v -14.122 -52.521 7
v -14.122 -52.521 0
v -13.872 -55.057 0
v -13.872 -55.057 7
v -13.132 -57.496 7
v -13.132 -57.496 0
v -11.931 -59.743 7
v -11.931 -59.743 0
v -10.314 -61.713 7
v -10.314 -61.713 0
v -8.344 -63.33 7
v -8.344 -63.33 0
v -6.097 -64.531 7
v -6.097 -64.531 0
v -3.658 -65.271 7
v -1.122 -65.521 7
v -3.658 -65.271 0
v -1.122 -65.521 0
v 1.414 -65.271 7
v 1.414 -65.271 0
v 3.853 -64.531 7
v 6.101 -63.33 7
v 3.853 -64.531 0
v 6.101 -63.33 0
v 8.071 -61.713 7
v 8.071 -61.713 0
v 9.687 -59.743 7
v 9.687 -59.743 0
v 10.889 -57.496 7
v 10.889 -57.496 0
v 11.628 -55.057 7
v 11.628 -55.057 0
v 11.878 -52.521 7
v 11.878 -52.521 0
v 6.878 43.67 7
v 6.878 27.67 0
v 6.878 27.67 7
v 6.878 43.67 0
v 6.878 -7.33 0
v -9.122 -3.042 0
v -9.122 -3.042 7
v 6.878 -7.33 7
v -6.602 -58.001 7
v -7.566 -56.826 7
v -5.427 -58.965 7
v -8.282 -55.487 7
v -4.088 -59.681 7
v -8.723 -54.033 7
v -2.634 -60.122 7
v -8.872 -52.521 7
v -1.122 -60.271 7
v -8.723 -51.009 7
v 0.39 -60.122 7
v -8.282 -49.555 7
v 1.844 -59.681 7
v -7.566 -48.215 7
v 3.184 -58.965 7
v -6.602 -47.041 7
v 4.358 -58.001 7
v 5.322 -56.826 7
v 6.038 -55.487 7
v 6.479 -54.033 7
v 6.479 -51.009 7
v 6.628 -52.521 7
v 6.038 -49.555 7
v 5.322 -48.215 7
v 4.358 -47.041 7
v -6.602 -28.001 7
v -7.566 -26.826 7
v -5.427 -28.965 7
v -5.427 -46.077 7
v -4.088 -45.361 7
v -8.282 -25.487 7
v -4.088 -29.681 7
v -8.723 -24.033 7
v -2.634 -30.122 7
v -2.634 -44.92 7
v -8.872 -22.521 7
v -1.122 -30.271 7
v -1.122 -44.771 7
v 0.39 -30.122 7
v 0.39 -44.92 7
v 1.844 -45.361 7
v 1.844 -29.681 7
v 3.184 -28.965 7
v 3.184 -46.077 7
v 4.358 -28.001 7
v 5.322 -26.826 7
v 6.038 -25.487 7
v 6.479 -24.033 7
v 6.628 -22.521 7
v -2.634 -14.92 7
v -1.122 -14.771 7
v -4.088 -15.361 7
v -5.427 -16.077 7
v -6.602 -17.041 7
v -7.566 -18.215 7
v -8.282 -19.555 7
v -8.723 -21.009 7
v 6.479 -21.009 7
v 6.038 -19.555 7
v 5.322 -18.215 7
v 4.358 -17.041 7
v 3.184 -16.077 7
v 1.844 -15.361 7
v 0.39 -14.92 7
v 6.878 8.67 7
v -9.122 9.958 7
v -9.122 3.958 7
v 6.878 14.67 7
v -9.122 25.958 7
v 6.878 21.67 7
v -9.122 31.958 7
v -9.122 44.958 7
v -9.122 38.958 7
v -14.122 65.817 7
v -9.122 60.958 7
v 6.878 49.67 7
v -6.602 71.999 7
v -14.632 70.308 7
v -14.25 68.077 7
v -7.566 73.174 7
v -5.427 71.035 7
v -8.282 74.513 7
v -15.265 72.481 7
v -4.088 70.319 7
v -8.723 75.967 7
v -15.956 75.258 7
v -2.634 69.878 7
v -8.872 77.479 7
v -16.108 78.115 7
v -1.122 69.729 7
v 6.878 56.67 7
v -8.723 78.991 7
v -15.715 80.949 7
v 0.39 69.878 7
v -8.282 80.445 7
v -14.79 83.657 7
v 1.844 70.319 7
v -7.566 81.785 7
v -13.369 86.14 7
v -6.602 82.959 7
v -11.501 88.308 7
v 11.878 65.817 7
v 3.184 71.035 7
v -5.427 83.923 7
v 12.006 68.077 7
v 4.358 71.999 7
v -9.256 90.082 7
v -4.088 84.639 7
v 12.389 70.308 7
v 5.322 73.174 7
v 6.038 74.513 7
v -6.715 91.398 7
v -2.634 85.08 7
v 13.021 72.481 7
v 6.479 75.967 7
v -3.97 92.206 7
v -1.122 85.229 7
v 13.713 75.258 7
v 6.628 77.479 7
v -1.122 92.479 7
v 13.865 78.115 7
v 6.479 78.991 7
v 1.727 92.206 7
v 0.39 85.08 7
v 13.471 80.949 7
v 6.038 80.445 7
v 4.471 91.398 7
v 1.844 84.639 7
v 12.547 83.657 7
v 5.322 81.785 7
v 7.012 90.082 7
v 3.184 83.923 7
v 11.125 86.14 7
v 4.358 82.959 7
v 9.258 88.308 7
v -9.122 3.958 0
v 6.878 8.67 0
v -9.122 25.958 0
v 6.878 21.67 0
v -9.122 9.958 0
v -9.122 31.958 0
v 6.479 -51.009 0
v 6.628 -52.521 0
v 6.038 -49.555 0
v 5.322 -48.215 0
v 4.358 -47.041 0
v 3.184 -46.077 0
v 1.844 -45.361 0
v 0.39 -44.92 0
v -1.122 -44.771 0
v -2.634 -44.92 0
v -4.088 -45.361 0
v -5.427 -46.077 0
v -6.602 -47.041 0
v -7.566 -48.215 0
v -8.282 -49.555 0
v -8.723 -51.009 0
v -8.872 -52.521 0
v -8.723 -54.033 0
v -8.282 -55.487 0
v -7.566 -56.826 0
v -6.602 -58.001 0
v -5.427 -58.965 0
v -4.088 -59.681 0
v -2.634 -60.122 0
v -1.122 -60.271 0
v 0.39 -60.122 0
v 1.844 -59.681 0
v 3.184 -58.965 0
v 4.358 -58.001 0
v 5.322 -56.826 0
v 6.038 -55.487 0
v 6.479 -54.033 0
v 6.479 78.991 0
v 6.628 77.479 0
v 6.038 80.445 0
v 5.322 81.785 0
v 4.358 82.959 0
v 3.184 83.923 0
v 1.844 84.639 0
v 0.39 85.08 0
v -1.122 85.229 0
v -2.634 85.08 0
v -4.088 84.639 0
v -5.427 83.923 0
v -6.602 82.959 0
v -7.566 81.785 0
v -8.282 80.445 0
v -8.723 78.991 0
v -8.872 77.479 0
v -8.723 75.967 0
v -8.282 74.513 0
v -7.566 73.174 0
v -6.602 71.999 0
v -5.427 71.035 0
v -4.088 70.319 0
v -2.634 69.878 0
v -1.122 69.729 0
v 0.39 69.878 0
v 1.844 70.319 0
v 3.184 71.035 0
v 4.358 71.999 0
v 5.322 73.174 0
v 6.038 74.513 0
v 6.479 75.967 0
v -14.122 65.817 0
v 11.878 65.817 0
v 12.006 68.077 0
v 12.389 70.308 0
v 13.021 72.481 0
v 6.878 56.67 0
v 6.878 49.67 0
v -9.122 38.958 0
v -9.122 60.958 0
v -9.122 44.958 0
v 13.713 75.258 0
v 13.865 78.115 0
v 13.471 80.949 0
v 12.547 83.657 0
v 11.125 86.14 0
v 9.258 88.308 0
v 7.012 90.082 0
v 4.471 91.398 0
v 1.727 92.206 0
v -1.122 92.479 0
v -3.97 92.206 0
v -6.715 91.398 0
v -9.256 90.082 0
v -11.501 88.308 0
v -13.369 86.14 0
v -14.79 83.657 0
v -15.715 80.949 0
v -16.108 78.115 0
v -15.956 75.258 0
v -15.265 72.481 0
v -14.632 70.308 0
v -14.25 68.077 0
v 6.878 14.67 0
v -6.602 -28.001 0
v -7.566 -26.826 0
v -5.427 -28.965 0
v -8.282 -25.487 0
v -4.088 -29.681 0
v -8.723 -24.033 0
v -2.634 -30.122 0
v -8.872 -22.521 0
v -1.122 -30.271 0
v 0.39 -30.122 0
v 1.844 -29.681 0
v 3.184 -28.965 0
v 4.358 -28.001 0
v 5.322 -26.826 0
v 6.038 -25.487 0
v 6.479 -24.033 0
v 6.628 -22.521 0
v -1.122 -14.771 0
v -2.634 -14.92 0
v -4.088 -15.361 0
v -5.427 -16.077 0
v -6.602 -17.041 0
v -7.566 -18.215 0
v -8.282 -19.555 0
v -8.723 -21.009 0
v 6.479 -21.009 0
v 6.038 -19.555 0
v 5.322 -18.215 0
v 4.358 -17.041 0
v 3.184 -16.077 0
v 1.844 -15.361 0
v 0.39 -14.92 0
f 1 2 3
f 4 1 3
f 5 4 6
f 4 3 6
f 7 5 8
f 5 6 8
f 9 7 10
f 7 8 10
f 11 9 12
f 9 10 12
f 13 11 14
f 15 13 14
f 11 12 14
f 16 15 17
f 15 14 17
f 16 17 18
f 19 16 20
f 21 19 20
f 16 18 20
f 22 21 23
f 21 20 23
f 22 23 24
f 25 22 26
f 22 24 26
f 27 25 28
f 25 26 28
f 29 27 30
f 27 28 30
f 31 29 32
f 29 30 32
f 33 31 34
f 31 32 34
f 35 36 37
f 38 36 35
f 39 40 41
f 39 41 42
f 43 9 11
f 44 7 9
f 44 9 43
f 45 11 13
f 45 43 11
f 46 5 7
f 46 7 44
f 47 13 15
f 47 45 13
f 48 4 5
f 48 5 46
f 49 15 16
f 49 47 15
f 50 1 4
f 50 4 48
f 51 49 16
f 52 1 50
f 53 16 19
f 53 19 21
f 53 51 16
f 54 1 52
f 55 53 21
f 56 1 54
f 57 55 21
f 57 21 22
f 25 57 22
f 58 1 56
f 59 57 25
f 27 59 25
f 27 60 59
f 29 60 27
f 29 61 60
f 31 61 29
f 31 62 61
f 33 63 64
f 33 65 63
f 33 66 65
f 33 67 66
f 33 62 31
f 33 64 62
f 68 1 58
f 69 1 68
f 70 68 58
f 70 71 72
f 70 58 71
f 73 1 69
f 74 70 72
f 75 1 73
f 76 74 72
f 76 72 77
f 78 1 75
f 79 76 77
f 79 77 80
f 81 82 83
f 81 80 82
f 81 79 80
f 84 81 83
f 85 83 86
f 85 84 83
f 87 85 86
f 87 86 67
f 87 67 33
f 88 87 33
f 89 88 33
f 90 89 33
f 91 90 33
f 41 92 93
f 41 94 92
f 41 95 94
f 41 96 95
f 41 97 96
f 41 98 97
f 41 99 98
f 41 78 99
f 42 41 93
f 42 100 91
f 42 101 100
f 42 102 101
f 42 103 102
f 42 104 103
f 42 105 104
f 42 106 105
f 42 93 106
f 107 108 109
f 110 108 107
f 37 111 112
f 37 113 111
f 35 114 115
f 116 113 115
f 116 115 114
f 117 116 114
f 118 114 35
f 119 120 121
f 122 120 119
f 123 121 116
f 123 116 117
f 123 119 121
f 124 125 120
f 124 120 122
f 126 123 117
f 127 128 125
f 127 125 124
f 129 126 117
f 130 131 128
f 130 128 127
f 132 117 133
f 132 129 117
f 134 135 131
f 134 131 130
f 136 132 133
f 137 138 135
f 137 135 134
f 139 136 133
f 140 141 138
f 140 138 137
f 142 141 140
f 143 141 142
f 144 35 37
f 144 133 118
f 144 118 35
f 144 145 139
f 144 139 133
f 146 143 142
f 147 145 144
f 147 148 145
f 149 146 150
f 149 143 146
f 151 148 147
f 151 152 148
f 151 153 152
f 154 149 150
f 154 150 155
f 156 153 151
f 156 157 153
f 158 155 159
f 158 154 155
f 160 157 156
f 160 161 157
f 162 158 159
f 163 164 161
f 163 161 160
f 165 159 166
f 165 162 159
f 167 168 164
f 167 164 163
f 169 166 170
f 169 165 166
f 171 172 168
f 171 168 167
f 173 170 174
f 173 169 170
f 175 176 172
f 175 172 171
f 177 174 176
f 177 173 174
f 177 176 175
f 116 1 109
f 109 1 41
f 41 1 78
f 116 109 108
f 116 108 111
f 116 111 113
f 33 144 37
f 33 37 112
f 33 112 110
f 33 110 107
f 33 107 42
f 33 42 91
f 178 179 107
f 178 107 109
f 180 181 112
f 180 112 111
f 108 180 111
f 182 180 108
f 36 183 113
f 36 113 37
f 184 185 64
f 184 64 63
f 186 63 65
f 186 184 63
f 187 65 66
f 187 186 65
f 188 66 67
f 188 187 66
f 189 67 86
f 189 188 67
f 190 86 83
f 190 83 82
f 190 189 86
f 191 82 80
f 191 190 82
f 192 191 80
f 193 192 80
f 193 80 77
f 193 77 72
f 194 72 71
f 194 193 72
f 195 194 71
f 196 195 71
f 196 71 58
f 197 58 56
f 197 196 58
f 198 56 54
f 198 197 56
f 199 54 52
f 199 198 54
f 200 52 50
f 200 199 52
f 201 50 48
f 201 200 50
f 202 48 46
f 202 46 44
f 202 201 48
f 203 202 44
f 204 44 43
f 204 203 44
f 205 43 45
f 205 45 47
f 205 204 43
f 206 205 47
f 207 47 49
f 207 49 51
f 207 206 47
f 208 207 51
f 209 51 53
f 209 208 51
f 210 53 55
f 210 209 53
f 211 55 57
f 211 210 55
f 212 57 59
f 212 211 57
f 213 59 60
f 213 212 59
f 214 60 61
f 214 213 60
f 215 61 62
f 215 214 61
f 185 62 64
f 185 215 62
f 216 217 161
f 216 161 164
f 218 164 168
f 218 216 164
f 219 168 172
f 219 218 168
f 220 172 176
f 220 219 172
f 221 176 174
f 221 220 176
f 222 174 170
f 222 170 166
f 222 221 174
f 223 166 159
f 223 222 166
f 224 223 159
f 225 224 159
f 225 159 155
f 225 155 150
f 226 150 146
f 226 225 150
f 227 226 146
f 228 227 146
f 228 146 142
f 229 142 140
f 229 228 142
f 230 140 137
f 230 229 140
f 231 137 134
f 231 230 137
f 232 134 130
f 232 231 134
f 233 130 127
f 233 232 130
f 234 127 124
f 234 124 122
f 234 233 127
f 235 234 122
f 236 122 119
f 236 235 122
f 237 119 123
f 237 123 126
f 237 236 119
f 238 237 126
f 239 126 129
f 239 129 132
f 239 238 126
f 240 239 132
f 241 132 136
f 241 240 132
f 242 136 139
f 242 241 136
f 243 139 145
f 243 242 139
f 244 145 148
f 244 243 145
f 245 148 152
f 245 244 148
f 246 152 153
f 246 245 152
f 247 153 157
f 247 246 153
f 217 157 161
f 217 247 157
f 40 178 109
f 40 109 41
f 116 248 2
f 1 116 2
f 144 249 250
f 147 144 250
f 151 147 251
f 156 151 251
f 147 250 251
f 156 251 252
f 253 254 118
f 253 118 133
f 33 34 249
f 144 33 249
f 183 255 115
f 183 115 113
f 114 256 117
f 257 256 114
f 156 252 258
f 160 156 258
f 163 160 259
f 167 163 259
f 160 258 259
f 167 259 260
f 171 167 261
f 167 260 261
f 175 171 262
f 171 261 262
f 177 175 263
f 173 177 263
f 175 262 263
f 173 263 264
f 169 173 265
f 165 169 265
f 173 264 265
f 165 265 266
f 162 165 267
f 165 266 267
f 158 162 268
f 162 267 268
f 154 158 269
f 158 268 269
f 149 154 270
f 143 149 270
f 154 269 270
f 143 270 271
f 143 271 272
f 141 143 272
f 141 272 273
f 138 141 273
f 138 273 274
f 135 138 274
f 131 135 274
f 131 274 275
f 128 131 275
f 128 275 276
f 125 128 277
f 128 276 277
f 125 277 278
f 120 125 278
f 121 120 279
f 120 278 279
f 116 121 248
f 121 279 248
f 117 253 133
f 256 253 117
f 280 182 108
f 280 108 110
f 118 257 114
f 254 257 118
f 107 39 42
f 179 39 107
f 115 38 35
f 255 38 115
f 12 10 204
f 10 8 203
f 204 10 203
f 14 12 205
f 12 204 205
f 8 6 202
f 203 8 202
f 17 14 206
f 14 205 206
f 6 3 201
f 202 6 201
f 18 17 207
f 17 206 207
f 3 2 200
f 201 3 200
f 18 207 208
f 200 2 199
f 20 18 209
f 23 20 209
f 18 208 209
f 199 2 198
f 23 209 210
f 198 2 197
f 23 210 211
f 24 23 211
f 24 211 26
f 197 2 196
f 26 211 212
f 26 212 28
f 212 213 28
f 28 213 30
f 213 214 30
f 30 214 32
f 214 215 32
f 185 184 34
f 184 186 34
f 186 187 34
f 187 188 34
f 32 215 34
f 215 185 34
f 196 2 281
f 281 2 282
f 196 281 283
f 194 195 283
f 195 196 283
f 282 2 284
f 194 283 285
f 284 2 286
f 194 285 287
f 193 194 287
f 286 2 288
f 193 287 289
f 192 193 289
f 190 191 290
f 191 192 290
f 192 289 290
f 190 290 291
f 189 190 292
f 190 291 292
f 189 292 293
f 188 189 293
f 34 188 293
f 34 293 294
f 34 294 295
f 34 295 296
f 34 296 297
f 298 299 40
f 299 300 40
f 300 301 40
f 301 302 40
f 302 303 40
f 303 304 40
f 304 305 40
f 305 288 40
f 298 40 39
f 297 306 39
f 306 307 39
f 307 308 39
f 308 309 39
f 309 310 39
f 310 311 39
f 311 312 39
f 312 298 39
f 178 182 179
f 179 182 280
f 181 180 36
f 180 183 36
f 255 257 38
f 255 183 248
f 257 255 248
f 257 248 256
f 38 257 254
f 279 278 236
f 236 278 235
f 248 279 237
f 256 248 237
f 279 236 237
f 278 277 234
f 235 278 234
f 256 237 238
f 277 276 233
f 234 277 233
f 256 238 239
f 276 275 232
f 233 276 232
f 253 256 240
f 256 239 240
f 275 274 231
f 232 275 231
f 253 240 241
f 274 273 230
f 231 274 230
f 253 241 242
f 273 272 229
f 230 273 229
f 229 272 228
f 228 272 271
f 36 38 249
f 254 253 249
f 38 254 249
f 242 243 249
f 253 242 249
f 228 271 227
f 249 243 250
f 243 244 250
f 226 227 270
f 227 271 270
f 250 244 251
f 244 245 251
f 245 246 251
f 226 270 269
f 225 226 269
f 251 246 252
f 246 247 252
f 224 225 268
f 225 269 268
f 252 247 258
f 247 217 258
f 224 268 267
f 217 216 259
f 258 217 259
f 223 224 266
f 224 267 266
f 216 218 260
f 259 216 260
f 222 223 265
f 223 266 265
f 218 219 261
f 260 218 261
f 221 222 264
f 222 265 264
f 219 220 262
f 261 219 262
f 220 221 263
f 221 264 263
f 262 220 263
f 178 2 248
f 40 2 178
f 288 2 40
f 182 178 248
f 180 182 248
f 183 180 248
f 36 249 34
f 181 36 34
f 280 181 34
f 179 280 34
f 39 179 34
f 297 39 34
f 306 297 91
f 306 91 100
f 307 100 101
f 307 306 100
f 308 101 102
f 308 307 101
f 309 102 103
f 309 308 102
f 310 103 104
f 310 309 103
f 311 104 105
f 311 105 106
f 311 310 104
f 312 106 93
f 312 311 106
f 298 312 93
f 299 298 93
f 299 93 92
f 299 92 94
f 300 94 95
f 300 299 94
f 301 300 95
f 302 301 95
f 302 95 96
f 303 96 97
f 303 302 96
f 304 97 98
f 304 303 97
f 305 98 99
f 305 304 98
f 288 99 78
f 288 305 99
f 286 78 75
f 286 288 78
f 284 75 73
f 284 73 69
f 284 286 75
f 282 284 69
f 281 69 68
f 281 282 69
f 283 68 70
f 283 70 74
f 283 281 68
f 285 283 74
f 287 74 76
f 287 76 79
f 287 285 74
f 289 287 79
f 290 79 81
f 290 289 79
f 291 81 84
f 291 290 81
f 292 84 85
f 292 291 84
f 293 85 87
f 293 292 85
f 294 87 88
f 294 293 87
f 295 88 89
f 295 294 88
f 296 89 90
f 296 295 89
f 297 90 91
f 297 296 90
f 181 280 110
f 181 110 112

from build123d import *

# Parameters (mm, degrees)
SKETCH1_R           = 7.75
BOSS_EXTRUDE1_DEPTH = 7


with BuildPart() as part:
    # Sketch1 → Boss-Extrude1 (new body)
    with BuildSketch(Plane.XY):
        with BuildLine():
            Line((-14.121781939, 65.817369233), (-14.121781939, -52.520726978))
            ThreePointArc((-14.121781939, -52.520726978), (-1.121781939, -65.520726978), (11.878218061, -52.520726978))
            Line((11.878218061, -52.520726978), (11.878218061, 65.817369233))
            ThreePointArc((11.878218061, 65.817369233), (12.166002849, 69.197986251), (13.021075204, 72.481314255))
            ThreePointArc((13.021075204, 72.481314255), (-1.121781939, 92.479273022), (-15.264639082, 72.481314255))
            ThreePointArc((-15.264639082, 72.481314255), (-14.409566727, 69.197986251), (-14.121781939, 65.817369233))
        make_face()
        with Locations((-1.121781939, -52.520726978)):
            Circle(SKETCH1_R, mode=Mode.SUBTRACT)
        with Locations((-1.121781939, -22.520726978)):
            Circle(SKETCH1_R, mode=Mode.SUBTRACT)
        with Locations((-1.121781939, 77.479273022)):
            Circle(SKETCH1_R, mode=Mode.SUBTRACT)
        Polygon((-9.121781939, 3.957653989), (-9.121781939, -3.042346011), (6.878218061, -7.32953309), (6.878218061, 8.67046691), align=None, mode=Mode.SUBTRACT)
        Polygon((-9.121781939, 31.957653989), (6.878218061, 27.67046691), (6.878218061, 43.67046691), (-9.121781939, 38.957653989), align=None, mode=Mode.SUBTRACT)
        Polygon((6.878218061, 56.67046691), (-9.121781939, 60.957653989), (-9.121781939, 44.957653989), (6.878218061, 49.67046691), align=None, mode=Mode.SUBTRACT)
        Polygon((-9.121781939, 9.957653989), (6.878218061, 14.67046691), (6.878218061, 21.67046691), (-9.121781939, 25.957653989), align=None, mode=Mode.SUBTRACT)
    extrude(amount=BOSS_EXTRUDE1_DEPTH)


solid = part.part
